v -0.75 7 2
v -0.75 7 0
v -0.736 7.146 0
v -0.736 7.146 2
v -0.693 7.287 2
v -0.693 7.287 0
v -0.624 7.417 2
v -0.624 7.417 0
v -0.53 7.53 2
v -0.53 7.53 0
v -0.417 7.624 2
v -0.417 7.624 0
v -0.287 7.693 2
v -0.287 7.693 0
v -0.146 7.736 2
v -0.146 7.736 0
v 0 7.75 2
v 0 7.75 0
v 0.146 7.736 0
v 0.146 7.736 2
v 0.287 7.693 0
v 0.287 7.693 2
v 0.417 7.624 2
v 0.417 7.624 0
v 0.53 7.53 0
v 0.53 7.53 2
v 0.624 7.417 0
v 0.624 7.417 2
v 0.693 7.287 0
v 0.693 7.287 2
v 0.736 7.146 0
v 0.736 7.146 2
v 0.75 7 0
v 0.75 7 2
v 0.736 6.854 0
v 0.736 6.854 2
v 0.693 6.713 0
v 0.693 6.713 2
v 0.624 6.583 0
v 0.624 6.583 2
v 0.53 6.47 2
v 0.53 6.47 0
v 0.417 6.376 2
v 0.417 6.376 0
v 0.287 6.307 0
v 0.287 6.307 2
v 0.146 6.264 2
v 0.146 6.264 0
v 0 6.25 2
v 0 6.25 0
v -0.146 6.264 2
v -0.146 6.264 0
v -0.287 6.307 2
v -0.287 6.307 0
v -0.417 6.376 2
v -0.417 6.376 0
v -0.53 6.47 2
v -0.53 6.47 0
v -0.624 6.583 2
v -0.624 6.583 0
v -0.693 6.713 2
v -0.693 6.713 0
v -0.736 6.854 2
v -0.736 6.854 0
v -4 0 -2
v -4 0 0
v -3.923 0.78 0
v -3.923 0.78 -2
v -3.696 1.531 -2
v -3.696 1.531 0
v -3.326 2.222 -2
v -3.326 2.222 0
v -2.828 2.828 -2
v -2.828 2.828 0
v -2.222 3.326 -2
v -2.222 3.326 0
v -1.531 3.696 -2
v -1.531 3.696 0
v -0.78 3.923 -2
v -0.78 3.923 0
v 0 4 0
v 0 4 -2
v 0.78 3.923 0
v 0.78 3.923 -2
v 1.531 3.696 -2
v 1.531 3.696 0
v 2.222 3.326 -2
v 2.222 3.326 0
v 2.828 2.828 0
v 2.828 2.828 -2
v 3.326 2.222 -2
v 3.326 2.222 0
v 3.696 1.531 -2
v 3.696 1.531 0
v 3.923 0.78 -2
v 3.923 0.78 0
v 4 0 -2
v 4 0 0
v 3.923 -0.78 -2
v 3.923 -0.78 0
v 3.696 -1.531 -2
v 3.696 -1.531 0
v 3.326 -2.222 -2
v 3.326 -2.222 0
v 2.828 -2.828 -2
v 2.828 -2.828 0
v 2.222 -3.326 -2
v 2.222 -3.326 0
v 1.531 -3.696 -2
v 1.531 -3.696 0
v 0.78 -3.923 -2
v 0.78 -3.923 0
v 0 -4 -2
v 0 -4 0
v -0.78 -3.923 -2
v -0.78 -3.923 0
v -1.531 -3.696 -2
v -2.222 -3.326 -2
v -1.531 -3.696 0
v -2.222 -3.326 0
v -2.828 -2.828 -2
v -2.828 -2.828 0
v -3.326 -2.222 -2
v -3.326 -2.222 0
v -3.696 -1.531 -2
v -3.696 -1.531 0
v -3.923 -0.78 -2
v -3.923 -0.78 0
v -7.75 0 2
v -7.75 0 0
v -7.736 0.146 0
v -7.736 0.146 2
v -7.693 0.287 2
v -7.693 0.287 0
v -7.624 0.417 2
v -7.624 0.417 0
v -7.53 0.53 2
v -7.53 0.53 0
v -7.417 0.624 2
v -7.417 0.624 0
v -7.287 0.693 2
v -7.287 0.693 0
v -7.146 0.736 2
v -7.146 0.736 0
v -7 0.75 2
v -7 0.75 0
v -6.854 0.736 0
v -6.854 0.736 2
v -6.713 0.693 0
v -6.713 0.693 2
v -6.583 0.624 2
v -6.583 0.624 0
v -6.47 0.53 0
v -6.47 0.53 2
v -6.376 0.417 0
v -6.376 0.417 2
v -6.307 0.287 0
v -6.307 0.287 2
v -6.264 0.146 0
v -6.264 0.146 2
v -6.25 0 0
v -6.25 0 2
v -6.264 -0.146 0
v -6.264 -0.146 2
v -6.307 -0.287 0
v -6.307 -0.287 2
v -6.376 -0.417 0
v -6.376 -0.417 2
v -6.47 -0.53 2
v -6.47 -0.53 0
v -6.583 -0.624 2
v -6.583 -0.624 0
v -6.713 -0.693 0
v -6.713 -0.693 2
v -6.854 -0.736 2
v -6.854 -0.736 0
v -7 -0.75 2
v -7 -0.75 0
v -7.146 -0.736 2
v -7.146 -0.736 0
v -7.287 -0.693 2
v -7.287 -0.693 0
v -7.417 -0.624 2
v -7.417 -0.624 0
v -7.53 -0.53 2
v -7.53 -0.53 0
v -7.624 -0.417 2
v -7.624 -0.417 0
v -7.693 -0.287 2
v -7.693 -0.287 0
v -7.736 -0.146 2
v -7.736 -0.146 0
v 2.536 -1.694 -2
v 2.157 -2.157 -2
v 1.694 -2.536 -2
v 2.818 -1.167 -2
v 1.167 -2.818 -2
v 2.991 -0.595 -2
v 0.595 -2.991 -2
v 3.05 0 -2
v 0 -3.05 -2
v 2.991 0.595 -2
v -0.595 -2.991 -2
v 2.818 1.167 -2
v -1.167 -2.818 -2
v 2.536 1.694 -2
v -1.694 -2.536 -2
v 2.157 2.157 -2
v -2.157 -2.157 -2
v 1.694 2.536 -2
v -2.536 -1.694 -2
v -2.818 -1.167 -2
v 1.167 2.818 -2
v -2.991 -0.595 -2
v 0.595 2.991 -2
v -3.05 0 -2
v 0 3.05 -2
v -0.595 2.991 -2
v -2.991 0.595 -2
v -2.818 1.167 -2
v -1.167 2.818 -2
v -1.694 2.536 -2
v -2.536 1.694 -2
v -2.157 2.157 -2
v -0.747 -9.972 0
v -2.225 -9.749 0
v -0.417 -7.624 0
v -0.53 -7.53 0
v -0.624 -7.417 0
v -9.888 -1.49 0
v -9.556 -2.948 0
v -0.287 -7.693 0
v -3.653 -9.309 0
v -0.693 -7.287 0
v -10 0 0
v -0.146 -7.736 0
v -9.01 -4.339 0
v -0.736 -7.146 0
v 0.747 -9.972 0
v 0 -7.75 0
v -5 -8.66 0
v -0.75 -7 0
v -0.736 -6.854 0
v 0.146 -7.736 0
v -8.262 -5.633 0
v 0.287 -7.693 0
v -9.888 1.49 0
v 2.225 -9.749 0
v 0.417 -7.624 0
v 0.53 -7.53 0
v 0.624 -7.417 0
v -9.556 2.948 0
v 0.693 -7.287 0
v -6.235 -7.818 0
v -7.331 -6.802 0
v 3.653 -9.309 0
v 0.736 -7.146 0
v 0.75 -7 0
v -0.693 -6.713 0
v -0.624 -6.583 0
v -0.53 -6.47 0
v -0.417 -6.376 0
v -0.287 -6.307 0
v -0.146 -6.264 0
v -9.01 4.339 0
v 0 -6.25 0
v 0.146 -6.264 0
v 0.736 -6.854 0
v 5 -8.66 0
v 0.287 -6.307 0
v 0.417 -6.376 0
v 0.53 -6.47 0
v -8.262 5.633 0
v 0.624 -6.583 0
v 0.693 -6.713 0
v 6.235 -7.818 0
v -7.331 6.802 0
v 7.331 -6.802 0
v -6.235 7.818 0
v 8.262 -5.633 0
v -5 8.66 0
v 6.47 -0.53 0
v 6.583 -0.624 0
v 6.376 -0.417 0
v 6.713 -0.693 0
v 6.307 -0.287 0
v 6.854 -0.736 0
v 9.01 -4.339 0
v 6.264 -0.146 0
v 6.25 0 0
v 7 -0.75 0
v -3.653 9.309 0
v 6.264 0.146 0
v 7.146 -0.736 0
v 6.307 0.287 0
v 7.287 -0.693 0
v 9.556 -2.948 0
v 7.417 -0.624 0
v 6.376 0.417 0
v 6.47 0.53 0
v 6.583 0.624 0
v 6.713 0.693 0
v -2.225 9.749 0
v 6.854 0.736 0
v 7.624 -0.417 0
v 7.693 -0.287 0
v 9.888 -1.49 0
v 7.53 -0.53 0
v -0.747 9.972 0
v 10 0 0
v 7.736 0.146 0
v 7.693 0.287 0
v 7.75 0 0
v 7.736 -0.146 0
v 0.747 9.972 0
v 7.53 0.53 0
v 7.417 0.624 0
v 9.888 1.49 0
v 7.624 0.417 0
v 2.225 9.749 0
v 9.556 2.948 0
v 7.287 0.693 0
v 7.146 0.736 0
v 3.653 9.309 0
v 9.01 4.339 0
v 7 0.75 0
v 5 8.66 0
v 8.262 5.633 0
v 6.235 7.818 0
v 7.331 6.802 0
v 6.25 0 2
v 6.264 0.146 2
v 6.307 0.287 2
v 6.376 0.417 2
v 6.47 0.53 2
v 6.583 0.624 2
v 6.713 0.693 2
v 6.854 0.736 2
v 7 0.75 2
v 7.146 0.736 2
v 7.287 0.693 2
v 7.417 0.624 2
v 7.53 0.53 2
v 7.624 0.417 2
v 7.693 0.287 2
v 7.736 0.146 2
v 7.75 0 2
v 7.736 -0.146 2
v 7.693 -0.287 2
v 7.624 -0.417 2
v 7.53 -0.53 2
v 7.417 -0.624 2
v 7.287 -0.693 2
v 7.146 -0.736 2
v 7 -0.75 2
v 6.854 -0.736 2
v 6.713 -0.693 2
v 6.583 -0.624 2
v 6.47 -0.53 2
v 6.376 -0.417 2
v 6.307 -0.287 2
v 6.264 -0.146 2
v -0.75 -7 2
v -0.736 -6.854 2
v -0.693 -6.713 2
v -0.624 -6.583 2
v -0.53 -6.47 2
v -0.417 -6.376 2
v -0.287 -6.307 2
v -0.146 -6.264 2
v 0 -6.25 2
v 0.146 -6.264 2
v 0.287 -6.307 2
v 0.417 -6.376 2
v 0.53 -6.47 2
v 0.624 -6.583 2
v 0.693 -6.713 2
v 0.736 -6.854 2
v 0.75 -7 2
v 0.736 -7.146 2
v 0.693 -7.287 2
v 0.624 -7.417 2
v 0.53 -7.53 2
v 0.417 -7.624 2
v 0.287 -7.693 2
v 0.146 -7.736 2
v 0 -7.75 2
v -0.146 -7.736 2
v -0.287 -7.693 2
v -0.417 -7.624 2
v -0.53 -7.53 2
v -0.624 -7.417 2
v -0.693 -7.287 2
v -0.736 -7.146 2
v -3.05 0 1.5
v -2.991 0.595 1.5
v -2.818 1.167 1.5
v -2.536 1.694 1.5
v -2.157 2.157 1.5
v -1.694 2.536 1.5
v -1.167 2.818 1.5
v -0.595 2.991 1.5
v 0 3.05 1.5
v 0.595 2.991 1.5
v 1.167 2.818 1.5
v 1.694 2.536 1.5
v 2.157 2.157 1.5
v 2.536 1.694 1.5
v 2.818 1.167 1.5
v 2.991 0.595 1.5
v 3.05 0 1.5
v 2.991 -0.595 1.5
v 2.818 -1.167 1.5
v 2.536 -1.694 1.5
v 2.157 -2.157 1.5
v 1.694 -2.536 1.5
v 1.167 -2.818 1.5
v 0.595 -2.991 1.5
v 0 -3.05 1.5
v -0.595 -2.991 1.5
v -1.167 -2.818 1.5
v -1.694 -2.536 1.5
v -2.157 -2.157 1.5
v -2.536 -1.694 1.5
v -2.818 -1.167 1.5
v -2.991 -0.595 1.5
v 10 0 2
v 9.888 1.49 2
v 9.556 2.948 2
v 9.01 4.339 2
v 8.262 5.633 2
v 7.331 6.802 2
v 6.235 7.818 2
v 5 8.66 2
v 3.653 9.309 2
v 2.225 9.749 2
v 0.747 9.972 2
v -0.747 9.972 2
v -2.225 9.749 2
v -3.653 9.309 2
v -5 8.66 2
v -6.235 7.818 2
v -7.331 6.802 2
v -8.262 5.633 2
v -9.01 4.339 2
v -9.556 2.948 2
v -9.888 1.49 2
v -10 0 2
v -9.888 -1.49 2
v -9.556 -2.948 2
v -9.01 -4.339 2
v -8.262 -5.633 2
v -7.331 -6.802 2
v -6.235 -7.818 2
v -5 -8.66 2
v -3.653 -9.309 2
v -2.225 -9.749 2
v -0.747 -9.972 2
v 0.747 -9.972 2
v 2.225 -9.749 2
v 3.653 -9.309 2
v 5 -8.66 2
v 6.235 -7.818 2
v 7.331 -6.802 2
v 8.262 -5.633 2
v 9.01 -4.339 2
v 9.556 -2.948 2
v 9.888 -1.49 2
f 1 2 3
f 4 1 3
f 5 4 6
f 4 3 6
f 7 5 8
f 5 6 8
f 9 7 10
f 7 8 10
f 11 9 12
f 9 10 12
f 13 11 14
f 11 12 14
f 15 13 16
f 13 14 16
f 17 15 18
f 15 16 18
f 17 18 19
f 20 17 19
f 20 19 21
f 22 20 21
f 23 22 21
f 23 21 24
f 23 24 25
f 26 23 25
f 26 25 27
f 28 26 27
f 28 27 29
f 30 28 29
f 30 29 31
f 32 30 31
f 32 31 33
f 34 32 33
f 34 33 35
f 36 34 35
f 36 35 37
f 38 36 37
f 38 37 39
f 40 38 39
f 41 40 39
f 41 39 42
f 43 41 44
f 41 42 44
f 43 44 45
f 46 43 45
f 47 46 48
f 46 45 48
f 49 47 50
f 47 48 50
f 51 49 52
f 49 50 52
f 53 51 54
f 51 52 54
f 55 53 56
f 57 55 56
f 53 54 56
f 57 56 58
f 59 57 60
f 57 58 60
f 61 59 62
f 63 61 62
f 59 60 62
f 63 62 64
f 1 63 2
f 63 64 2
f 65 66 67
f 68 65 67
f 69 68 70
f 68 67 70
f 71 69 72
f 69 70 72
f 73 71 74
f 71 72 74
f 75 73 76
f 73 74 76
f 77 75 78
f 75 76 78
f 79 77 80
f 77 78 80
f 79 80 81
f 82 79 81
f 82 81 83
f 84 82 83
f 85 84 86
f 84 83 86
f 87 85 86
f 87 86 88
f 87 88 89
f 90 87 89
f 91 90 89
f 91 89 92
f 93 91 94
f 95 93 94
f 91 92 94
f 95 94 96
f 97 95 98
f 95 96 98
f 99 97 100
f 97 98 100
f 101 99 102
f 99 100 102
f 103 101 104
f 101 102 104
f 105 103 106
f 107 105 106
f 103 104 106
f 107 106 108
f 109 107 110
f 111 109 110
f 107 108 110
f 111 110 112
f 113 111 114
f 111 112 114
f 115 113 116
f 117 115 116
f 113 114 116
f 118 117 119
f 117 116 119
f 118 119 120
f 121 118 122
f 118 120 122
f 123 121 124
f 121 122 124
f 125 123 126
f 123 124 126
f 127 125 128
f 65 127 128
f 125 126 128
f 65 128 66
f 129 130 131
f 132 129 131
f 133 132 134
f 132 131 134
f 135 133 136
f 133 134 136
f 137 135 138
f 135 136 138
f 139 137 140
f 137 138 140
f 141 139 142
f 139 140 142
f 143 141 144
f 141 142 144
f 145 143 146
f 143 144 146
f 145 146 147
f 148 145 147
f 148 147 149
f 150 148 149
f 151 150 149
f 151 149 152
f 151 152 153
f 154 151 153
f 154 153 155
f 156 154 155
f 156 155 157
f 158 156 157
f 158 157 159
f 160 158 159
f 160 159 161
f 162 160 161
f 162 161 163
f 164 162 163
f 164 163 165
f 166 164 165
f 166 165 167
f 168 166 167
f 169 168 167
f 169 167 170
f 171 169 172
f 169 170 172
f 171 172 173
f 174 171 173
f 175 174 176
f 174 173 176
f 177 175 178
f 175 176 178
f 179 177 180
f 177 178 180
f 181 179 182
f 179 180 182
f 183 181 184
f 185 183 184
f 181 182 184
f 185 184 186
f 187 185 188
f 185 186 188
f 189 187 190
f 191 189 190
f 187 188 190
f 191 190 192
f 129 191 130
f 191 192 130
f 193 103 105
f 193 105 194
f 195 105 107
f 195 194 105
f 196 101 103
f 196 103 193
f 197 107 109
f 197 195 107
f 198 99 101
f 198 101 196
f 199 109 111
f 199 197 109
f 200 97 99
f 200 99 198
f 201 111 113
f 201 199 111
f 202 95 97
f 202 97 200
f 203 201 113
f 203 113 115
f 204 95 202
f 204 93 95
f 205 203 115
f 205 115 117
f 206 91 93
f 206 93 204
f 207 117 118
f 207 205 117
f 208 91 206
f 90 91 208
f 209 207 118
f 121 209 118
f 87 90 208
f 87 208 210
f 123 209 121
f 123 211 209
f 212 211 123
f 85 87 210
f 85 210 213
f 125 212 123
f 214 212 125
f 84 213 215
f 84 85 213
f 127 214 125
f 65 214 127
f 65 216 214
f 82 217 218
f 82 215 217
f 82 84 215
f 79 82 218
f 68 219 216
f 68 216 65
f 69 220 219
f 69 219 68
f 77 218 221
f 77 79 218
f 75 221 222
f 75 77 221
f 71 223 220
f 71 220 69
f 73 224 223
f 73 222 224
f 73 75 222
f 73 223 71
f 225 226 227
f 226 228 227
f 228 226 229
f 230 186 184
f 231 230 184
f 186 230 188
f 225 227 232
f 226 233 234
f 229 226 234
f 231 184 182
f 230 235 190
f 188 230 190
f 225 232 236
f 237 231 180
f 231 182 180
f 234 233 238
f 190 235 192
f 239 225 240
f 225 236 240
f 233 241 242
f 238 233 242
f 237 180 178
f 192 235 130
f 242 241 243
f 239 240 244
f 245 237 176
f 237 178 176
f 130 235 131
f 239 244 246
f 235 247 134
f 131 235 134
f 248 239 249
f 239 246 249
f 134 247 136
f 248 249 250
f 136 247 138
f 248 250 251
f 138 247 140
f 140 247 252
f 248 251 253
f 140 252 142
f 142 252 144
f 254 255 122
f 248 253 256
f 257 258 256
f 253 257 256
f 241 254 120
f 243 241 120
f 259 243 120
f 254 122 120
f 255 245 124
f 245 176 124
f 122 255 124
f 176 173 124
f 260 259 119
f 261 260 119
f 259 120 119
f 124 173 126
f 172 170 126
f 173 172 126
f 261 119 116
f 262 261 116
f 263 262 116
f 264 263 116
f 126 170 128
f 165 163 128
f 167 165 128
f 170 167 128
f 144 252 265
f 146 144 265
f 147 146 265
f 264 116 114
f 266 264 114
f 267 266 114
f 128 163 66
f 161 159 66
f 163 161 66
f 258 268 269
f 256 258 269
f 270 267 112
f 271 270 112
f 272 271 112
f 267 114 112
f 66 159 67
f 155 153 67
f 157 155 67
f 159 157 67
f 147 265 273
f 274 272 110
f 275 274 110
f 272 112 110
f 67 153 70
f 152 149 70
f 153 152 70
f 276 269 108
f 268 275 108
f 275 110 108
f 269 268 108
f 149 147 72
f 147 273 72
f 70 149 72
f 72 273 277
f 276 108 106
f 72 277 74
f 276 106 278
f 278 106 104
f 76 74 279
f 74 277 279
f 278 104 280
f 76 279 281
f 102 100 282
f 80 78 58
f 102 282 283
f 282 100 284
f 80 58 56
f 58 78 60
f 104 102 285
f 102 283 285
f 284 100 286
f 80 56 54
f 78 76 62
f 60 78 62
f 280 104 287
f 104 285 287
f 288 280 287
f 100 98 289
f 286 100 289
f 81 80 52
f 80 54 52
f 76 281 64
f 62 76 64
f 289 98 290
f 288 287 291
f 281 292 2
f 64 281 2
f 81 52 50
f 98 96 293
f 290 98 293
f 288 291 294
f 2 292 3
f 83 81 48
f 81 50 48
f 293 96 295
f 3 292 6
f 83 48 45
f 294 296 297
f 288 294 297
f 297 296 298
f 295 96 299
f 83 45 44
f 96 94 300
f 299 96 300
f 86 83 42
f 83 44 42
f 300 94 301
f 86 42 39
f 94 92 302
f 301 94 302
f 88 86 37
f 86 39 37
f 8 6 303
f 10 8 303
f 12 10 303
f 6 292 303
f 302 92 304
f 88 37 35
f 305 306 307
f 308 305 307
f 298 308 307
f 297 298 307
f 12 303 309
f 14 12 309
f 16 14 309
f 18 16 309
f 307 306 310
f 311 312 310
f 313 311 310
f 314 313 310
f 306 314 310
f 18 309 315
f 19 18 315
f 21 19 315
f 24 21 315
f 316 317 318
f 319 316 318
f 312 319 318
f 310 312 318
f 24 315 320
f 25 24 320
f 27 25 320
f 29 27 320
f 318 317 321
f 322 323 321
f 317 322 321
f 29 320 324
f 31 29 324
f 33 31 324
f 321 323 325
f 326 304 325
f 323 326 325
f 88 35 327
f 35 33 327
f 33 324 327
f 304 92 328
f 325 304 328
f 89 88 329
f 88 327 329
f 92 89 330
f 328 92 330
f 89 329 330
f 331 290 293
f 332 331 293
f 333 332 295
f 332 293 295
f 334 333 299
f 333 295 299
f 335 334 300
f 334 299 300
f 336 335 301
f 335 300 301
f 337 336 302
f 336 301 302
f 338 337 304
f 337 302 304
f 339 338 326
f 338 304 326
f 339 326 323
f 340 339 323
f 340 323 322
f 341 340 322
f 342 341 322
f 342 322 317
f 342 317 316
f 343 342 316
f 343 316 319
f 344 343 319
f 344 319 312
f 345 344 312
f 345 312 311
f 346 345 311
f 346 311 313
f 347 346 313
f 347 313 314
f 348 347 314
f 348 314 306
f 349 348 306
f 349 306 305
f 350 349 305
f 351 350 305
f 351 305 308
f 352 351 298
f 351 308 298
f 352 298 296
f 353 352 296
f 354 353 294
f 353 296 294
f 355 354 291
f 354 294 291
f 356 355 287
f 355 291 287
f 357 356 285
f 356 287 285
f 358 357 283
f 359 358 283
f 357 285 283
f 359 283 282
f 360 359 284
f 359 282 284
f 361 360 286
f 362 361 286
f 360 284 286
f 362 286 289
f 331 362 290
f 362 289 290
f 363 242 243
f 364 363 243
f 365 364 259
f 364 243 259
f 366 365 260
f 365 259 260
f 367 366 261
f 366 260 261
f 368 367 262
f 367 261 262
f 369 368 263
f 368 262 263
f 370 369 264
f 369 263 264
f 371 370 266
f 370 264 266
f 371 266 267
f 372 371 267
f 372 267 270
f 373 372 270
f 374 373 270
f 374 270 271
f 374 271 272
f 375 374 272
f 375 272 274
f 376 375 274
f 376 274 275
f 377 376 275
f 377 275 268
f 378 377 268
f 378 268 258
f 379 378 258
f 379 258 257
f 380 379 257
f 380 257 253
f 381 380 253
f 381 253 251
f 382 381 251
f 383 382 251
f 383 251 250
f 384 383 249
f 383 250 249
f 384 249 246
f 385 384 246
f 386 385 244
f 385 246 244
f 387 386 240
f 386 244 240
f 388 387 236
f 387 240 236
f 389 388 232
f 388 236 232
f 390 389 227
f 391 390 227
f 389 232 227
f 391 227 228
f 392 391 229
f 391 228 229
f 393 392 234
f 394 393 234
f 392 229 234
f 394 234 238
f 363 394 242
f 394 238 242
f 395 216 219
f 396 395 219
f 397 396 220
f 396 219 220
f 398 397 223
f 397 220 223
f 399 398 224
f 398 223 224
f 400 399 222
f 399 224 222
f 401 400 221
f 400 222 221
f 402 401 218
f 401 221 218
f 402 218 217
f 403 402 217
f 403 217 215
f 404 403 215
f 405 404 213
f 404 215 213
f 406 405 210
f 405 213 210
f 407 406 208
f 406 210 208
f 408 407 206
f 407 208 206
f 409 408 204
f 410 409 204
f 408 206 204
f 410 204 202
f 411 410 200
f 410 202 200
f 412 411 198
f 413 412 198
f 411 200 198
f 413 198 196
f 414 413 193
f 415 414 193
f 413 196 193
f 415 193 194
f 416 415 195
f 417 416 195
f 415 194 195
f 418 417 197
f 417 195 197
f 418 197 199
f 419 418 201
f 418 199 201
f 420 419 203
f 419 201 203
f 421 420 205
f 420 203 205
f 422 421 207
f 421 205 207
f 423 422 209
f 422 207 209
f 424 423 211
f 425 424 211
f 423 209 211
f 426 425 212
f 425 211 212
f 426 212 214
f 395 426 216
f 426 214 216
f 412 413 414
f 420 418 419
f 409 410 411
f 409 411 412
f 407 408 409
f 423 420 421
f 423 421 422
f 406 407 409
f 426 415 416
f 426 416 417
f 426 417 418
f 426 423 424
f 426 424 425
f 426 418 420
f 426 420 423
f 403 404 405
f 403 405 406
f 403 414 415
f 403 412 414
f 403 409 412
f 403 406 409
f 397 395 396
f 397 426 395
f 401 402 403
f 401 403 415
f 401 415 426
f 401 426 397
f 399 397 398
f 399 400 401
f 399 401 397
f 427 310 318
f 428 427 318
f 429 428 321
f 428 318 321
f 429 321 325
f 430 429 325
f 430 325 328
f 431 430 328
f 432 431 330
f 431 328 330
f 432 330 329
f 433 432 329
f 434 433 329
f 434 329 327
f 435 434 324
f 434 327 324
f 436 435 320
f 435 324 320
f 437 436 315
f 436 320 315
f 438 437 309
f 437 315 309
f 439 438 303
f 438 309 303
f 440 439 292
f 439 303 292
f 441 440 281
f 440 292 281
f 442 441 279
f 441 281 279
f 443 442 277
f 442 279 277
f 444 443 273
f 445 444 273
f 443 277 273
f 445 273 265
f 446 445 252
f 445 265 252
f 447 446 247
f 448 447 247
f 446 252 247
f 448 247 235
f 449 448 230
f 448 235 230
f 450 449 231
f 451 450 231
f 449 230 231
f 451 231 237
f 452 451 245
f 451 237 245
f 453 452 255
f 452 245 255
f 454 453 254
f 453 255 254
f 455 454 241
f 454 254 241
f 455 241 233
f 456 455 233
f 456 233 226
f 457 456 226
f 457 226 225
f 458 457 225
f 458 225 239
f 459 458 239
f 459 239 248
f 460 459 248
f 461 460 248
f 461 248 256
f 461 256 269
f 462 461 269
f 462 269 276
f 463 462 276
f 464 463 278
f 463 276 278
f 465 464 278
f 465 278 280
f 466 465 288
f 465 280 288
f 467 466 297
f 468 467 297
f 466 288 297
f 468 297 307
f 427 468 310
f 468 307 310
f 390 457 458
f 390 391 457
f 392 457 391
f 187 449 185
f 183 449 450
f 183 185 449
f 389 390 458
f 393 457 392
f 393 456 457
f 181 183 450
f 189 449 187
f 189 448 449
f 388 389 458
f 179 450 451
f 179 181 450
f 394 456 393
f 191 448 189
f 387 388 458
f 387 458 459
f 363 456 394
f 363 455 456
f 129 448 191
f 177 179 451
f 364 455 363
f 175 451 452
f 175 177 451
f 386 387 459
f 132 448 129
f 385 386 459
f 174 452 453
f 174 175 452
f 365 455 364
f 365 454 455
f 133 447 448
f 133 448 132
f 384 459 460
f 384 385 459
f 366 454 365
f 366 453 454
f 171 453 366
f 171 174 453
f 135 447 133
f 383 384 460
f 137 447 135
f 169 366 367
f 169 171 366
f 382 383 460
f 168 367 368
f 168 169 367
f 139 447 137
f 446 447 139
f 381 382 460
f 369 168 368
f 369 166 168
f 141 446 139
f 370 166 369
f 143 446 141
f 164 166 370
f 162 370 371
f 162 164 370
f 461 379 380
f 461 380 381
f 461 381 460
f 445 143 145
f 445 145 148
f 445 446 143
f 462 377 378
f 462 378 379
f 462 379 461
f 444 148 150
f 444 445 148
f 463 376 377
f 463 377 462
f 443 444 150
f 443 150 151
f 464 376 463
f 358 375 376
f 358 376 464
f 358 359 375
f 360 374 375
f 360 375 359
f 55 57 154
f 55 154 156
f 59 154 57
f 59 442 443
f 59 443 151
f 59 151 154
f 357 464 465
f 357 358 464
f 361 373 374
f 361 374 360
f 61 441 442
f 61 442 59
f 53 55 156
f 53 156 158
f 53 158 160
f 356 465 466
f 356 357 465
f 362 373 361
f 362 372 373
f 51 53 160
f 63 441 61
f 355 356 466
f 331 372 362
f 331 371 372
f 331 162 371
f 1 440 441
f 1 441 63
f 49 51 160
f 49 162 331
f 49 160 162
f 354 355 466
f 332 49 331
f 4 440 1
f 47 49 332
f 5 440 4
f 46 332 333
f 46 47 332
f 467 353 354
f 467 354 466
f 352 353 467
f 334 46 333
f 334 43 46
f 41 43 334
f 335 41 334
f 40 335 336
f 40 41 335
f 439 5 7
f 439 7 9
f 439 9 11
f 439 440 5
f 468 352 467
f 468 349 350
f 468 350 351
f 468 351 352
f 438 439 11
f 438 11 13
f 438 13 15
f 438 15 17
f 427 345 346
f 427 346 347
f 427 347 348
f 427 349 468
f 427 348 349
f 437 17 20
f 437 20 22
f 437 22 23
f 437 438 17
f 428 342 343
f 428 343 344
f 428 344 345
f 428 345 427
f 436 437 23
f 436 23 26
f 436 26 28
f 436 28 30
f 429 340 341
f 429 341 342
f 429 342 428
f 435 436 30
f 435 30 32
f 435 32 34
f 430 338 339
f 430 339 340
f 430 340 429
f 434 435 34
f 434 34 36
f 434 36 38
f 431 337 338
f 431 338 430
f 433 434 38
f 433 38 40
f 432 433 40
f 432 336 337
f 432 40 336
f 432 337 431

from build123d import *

# Parameters (mm, degrees)
SKETCH_1_R          = 10
EXTRUDE_1_DEPTH     = 2
SKETCH_2_R          = 4
EXTRUDE_2_DEPTH     = 2
SKETCH_3_R          = 3.05
CUT_EXTRUDE_1_DEPTH = 3.5
SKETCH_4_R          = 0.75
CUT_EXTRUDE_2_DEPTH = 15.282856857


with BuildPart() as part:
    # 草图1 → 凸台-拉伸1 (new body)
    with BuildSketch(Plane.XY):
        Circle(SKETCH_1_R)
    extrude(amount=EXTRUDE_1_DEPTH)

    # 草图2 → 凸台-拉伸2 (add)
    with BuildSketch(Plane(origin=(0, 0, 0), x_dir=(-1, 0, 0), z_dir=(0, 0, -1))):
        Circle(SKETCH_2_R)
    extrude(amount=EXTRUDE_2_DEPTH)

    # 草图3 → 切除-拉伸1 (cut)
    with BuildSketch(Plane(origin=(0, 0, -2), x_dir=(-1, 0, 0), z_dir=(0, 0, -1))):
        Circle(SKETCH_3_R)
    extrude(amount=-CUT_EXTRUDE_1_DEPTH, mode=Mode.SUBTRACT)

    # 草图4 → 切除-拉伸2 (cut, through all)
    with BuildSketch(Plane(origin=(0, 0, 0), x_dir=(-1, 0, 0), z_dir=(0, 0, -1))):
        with Locations((0, 7)):
            Circle(SKETCH_4_R)
        with Locations((7, 0)):
            Circle(SKETCH_4_R)
        with Locations((0, -7)):
            Circle(SKETCH_4_R)
        with Locations((-7, 0)):
            Circle(SKETCH_4_R)
    extrude(amount=-CUT_EXTRUDE_2_DEPTH, mode=Mode.SUBTRACT)


solid = part.part
